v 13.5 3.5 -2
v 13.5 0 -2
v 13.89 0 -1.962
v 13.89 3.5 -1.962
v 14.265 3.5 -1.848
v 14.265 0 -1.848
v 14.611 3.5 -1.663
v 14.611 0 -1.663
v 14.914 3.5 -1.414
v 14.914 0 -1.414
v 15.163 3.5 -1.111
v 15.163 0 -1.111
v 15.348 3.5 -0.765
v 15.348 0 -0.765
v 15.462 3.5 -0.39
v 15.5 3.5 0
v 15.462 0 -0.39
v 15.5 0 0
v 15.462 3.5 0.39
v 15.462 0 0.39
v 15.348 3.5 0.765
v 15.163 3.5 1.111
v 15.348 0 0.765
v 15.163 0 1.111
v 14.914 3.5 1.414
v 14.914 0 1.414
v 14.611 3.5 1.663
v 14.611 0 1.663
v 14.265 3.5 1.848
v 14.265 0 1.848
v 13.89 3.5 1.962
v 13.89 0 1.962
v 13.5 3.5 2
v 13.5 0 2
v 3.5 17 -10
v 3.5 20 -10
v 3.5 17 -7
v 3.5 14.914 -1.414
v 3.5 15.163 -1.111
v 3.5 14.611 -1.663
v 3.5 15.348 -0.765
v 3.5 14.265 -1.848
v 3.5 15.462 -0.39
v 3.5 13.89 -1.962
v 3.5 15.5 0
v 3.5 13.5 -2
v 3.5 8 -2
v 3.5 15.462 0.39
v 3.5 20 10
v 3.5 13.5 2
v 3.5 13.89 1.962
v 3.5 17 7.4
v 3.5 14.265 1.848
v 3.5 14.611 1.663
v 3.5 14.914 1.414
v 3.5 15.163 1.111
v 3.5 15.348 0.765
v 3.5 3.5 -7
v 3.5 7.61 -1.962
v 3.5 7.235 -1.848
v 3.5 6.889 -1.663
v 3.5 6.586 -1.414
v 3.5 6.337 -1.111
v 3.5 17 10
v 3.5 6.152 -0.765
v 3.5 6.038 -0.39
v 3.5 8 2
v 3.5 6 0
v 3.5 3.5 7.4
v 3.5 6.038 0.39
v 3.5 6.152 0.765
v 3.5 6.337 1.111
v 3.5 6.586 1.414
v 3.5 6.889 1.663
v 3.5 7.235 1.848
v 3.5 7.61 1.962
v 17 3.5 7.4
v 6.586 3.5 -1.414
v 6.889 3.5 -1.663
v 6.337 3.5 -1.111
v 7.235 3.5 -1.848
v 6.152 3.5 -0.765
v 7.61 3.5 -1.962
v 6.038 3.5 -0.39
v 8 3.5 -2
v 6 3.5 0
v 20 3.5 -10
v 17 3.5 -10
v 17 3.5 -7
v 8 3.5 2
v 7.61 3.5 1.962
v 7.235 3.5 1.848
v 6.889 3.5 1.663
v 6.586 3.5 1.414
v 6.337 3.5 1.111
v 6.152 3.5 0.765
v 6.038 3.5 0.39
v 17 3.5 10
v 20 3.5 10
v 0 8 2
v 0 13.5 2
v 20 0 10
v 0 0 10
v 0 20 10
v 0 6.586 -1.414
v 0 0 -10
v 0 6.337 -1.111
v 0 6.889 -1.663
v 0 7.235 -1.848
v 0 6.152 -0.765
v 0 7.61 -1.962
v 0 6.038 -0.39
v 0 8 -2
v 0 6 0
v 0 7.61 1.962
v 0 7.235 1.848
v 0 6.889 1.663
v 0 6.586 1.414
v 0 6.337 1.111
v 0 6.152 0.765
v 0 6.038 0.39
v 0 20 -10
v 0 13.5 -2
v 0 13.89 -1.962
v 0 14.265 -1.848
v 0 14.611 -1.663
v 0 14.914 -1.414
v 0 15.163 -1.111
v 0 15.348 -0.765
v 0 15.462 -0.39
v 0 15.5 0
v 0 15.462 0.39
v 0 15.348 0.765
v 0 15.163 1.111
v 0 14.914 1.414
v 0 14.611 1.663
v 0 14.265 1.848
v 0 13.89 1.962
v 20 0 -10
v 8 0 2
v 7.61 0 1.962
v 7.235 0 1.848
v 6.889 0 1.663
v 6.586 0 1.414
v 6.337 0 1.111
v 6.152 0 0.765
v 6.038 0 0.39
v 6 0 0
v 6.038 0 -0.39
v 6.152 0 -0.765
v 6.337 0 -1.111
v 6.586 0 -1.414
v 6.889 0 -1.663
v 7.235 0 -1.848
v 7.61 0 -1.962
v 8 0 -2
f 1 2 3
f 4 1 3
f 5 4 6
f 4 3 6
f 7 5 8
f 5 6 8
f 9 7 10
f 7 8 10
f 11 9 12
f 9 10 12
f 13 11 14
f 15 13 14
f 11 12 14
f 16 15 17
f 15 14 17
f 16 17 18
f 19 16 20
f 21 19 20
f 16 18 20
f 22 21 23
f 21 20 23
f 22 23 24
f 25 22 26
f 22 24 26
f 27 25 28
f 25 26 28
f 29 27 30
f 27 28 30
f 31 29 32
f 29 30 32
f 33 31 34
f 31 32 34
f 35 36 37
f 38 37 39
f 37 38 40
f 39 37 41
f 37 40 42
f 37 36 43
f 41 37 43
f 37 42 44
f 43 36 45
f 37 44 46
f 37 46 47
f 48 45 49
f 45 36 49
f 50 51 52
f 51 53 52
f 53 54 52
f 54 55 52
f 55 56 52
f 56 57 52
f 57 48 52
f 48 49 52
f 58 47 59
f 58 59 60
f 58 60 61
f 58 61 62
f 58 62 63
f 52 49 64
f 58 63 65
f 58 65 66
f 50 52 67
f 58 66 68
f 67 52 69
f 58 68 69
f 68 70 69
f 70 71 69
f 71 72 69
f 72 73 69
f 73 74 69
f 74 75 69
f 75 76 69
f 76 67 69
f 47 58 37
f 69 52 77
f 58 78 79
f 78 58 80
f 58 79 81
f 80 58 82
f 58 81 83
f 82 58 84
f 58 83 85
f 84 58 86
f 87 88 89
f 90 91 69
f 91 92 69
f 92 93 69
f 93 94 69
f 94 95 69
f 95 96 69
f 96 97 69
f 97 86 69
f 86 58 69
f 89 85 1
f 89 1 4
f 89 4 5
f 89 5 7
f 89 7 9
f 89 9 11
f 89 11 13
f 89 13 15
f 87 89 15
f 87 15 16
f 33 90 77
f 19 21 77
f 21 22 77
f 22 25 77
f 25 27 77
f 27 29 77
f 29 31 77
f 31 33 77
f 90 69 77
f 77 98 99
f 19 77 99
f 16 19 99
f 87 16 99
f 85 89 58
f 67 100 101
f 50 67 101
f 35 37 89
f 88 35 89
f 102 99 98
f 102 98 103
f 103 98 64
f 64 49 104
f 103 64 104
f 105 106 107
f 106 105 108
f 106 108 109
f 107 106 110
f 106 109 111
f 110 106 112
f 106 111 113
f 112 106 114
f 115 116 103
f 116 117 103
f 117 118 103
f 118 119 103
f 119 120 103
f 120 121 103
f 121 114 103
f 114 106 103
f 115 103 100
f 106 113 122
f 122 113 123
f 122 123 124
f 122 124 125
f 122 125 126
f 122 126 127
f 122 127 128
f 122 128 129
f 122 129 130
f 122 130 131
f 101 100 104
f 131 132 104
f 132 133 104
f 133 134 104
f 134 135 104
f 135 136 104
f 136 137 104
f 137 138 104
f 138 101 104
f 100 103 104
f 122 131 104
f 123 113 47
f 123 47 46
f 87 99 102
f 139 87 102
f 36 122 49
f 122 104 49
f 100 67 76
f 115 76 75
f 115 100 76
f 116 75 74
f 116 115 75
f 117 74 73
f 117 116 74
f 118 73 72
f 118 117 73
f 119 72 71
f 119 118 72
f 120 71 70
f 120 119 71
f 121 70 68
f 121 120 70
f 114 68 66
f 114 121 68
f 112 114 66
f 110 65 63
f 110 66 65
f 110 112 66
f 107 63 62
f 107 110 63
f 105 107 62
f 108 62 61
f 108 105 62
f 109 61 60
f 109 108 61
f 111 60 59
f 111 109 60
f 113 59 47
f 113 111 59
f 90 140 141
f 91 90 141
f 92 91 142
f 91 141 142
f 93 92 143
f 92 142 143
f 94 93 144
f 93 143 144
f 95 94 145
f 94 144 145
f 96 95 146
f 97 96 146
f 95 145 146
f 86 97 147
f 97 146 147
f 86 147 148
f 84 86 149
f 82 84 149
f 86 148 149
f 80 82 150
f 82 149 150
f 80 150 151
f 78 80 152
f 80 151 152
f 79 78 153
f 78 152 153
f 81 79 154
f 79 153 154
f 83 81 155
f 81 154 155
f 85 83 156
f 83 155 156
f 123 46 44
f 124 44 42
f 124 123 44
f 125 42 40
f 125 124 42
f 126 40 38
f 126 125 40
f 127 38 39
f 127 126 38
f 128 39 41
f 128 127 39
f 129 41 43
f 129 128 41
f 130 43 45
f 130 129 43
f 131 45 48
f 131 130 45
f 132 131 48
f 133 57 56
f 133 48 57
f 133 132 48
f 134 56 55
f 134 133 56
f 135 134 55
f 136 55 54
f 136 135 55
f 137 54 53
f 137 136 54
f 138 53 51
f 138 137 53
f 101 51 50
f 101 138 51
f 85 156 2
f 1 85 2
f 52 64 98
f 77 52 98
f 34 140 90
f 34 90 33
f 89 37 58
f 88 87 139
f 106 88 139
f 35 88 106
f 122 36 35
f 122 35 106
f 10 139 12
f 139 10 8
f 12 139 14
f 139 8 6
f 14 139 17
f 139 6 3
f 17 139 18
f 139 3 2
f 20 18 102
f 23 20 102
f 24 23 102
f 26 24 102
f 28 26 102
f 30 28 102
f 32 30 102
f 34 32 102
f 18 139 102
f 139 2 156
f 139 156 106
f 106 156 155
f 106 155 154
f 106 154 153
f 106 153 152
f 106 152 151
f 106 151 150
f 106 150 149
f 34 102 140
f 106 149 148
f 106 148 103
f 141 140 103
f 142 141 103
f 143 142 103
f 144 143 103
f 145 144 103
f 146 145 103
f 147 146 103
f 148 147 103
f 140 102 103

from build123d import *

# Parameters (mm, degrees)
PAD_DEPTH       = 10
BOX_W           = 27
BOX_H           = 24.4
BOX_DEPTH       = 14.4
POCKET_DEPTH    = 20.001
POCKET001_DEPTH = 20.001


with BuildPart() as part:
    # Sketch → Pad (new body, symmetric)
    with BuildSketch(Plane.XY):
        Polygon((0, 0), (0, 20), (3.5, 20), (3.5, 17), (17, 3.5), (20, 3.5), (20, 0), align=None)
    extrude(amount=PAD_DEPTH, both=True)

    # Box → Box (cut)
    with BuildSketch(Plane(origin=(3.5, 3.5, -7), x_dir=(1, 0, 0), z_dir=(0, 0, 1))):
        with Locations((13.5, 12.2)):
            Rectangle(BOX_W, BOX_H)
    extrude(amount=BOX_DEPTH, mode=Mode.SUBTRACT)

    # Sketch001 → Pocket (cut, through all)
    with BuildSketch(Plane.XZ):
        with BuildLine():
            ThreePointArc((8, 2), (6, 0), (8, -2))
            Line((8, -2), (13.5, -2))
            ThreePointArc((13.5, -2), (15.5, 0), (13.5, 2))
            Line((8, 2), (13.5, 2))
        make_face()
    extrude(amount=-POCKET_DEPTH, mode=Mode.SUBTRACT)

    # Sketch002 → Pocket001 (cut, through all)
    with BuildSketch(Plane.YZ):
        with BuildLine():
            ThreePointArc((8, 2), (6, 0), (8, -2))
            Line((8, -2), (13.5, -2))
            ThreePointArc((13.5, -2), (15.5, 0), (13.5, 2))
            Line((8, 2), (13.5, 2))
        make_face()
    extrude(amount=POCKET001_DEPTH, mode=Mode.SUBTRACT)


solid = part.part
